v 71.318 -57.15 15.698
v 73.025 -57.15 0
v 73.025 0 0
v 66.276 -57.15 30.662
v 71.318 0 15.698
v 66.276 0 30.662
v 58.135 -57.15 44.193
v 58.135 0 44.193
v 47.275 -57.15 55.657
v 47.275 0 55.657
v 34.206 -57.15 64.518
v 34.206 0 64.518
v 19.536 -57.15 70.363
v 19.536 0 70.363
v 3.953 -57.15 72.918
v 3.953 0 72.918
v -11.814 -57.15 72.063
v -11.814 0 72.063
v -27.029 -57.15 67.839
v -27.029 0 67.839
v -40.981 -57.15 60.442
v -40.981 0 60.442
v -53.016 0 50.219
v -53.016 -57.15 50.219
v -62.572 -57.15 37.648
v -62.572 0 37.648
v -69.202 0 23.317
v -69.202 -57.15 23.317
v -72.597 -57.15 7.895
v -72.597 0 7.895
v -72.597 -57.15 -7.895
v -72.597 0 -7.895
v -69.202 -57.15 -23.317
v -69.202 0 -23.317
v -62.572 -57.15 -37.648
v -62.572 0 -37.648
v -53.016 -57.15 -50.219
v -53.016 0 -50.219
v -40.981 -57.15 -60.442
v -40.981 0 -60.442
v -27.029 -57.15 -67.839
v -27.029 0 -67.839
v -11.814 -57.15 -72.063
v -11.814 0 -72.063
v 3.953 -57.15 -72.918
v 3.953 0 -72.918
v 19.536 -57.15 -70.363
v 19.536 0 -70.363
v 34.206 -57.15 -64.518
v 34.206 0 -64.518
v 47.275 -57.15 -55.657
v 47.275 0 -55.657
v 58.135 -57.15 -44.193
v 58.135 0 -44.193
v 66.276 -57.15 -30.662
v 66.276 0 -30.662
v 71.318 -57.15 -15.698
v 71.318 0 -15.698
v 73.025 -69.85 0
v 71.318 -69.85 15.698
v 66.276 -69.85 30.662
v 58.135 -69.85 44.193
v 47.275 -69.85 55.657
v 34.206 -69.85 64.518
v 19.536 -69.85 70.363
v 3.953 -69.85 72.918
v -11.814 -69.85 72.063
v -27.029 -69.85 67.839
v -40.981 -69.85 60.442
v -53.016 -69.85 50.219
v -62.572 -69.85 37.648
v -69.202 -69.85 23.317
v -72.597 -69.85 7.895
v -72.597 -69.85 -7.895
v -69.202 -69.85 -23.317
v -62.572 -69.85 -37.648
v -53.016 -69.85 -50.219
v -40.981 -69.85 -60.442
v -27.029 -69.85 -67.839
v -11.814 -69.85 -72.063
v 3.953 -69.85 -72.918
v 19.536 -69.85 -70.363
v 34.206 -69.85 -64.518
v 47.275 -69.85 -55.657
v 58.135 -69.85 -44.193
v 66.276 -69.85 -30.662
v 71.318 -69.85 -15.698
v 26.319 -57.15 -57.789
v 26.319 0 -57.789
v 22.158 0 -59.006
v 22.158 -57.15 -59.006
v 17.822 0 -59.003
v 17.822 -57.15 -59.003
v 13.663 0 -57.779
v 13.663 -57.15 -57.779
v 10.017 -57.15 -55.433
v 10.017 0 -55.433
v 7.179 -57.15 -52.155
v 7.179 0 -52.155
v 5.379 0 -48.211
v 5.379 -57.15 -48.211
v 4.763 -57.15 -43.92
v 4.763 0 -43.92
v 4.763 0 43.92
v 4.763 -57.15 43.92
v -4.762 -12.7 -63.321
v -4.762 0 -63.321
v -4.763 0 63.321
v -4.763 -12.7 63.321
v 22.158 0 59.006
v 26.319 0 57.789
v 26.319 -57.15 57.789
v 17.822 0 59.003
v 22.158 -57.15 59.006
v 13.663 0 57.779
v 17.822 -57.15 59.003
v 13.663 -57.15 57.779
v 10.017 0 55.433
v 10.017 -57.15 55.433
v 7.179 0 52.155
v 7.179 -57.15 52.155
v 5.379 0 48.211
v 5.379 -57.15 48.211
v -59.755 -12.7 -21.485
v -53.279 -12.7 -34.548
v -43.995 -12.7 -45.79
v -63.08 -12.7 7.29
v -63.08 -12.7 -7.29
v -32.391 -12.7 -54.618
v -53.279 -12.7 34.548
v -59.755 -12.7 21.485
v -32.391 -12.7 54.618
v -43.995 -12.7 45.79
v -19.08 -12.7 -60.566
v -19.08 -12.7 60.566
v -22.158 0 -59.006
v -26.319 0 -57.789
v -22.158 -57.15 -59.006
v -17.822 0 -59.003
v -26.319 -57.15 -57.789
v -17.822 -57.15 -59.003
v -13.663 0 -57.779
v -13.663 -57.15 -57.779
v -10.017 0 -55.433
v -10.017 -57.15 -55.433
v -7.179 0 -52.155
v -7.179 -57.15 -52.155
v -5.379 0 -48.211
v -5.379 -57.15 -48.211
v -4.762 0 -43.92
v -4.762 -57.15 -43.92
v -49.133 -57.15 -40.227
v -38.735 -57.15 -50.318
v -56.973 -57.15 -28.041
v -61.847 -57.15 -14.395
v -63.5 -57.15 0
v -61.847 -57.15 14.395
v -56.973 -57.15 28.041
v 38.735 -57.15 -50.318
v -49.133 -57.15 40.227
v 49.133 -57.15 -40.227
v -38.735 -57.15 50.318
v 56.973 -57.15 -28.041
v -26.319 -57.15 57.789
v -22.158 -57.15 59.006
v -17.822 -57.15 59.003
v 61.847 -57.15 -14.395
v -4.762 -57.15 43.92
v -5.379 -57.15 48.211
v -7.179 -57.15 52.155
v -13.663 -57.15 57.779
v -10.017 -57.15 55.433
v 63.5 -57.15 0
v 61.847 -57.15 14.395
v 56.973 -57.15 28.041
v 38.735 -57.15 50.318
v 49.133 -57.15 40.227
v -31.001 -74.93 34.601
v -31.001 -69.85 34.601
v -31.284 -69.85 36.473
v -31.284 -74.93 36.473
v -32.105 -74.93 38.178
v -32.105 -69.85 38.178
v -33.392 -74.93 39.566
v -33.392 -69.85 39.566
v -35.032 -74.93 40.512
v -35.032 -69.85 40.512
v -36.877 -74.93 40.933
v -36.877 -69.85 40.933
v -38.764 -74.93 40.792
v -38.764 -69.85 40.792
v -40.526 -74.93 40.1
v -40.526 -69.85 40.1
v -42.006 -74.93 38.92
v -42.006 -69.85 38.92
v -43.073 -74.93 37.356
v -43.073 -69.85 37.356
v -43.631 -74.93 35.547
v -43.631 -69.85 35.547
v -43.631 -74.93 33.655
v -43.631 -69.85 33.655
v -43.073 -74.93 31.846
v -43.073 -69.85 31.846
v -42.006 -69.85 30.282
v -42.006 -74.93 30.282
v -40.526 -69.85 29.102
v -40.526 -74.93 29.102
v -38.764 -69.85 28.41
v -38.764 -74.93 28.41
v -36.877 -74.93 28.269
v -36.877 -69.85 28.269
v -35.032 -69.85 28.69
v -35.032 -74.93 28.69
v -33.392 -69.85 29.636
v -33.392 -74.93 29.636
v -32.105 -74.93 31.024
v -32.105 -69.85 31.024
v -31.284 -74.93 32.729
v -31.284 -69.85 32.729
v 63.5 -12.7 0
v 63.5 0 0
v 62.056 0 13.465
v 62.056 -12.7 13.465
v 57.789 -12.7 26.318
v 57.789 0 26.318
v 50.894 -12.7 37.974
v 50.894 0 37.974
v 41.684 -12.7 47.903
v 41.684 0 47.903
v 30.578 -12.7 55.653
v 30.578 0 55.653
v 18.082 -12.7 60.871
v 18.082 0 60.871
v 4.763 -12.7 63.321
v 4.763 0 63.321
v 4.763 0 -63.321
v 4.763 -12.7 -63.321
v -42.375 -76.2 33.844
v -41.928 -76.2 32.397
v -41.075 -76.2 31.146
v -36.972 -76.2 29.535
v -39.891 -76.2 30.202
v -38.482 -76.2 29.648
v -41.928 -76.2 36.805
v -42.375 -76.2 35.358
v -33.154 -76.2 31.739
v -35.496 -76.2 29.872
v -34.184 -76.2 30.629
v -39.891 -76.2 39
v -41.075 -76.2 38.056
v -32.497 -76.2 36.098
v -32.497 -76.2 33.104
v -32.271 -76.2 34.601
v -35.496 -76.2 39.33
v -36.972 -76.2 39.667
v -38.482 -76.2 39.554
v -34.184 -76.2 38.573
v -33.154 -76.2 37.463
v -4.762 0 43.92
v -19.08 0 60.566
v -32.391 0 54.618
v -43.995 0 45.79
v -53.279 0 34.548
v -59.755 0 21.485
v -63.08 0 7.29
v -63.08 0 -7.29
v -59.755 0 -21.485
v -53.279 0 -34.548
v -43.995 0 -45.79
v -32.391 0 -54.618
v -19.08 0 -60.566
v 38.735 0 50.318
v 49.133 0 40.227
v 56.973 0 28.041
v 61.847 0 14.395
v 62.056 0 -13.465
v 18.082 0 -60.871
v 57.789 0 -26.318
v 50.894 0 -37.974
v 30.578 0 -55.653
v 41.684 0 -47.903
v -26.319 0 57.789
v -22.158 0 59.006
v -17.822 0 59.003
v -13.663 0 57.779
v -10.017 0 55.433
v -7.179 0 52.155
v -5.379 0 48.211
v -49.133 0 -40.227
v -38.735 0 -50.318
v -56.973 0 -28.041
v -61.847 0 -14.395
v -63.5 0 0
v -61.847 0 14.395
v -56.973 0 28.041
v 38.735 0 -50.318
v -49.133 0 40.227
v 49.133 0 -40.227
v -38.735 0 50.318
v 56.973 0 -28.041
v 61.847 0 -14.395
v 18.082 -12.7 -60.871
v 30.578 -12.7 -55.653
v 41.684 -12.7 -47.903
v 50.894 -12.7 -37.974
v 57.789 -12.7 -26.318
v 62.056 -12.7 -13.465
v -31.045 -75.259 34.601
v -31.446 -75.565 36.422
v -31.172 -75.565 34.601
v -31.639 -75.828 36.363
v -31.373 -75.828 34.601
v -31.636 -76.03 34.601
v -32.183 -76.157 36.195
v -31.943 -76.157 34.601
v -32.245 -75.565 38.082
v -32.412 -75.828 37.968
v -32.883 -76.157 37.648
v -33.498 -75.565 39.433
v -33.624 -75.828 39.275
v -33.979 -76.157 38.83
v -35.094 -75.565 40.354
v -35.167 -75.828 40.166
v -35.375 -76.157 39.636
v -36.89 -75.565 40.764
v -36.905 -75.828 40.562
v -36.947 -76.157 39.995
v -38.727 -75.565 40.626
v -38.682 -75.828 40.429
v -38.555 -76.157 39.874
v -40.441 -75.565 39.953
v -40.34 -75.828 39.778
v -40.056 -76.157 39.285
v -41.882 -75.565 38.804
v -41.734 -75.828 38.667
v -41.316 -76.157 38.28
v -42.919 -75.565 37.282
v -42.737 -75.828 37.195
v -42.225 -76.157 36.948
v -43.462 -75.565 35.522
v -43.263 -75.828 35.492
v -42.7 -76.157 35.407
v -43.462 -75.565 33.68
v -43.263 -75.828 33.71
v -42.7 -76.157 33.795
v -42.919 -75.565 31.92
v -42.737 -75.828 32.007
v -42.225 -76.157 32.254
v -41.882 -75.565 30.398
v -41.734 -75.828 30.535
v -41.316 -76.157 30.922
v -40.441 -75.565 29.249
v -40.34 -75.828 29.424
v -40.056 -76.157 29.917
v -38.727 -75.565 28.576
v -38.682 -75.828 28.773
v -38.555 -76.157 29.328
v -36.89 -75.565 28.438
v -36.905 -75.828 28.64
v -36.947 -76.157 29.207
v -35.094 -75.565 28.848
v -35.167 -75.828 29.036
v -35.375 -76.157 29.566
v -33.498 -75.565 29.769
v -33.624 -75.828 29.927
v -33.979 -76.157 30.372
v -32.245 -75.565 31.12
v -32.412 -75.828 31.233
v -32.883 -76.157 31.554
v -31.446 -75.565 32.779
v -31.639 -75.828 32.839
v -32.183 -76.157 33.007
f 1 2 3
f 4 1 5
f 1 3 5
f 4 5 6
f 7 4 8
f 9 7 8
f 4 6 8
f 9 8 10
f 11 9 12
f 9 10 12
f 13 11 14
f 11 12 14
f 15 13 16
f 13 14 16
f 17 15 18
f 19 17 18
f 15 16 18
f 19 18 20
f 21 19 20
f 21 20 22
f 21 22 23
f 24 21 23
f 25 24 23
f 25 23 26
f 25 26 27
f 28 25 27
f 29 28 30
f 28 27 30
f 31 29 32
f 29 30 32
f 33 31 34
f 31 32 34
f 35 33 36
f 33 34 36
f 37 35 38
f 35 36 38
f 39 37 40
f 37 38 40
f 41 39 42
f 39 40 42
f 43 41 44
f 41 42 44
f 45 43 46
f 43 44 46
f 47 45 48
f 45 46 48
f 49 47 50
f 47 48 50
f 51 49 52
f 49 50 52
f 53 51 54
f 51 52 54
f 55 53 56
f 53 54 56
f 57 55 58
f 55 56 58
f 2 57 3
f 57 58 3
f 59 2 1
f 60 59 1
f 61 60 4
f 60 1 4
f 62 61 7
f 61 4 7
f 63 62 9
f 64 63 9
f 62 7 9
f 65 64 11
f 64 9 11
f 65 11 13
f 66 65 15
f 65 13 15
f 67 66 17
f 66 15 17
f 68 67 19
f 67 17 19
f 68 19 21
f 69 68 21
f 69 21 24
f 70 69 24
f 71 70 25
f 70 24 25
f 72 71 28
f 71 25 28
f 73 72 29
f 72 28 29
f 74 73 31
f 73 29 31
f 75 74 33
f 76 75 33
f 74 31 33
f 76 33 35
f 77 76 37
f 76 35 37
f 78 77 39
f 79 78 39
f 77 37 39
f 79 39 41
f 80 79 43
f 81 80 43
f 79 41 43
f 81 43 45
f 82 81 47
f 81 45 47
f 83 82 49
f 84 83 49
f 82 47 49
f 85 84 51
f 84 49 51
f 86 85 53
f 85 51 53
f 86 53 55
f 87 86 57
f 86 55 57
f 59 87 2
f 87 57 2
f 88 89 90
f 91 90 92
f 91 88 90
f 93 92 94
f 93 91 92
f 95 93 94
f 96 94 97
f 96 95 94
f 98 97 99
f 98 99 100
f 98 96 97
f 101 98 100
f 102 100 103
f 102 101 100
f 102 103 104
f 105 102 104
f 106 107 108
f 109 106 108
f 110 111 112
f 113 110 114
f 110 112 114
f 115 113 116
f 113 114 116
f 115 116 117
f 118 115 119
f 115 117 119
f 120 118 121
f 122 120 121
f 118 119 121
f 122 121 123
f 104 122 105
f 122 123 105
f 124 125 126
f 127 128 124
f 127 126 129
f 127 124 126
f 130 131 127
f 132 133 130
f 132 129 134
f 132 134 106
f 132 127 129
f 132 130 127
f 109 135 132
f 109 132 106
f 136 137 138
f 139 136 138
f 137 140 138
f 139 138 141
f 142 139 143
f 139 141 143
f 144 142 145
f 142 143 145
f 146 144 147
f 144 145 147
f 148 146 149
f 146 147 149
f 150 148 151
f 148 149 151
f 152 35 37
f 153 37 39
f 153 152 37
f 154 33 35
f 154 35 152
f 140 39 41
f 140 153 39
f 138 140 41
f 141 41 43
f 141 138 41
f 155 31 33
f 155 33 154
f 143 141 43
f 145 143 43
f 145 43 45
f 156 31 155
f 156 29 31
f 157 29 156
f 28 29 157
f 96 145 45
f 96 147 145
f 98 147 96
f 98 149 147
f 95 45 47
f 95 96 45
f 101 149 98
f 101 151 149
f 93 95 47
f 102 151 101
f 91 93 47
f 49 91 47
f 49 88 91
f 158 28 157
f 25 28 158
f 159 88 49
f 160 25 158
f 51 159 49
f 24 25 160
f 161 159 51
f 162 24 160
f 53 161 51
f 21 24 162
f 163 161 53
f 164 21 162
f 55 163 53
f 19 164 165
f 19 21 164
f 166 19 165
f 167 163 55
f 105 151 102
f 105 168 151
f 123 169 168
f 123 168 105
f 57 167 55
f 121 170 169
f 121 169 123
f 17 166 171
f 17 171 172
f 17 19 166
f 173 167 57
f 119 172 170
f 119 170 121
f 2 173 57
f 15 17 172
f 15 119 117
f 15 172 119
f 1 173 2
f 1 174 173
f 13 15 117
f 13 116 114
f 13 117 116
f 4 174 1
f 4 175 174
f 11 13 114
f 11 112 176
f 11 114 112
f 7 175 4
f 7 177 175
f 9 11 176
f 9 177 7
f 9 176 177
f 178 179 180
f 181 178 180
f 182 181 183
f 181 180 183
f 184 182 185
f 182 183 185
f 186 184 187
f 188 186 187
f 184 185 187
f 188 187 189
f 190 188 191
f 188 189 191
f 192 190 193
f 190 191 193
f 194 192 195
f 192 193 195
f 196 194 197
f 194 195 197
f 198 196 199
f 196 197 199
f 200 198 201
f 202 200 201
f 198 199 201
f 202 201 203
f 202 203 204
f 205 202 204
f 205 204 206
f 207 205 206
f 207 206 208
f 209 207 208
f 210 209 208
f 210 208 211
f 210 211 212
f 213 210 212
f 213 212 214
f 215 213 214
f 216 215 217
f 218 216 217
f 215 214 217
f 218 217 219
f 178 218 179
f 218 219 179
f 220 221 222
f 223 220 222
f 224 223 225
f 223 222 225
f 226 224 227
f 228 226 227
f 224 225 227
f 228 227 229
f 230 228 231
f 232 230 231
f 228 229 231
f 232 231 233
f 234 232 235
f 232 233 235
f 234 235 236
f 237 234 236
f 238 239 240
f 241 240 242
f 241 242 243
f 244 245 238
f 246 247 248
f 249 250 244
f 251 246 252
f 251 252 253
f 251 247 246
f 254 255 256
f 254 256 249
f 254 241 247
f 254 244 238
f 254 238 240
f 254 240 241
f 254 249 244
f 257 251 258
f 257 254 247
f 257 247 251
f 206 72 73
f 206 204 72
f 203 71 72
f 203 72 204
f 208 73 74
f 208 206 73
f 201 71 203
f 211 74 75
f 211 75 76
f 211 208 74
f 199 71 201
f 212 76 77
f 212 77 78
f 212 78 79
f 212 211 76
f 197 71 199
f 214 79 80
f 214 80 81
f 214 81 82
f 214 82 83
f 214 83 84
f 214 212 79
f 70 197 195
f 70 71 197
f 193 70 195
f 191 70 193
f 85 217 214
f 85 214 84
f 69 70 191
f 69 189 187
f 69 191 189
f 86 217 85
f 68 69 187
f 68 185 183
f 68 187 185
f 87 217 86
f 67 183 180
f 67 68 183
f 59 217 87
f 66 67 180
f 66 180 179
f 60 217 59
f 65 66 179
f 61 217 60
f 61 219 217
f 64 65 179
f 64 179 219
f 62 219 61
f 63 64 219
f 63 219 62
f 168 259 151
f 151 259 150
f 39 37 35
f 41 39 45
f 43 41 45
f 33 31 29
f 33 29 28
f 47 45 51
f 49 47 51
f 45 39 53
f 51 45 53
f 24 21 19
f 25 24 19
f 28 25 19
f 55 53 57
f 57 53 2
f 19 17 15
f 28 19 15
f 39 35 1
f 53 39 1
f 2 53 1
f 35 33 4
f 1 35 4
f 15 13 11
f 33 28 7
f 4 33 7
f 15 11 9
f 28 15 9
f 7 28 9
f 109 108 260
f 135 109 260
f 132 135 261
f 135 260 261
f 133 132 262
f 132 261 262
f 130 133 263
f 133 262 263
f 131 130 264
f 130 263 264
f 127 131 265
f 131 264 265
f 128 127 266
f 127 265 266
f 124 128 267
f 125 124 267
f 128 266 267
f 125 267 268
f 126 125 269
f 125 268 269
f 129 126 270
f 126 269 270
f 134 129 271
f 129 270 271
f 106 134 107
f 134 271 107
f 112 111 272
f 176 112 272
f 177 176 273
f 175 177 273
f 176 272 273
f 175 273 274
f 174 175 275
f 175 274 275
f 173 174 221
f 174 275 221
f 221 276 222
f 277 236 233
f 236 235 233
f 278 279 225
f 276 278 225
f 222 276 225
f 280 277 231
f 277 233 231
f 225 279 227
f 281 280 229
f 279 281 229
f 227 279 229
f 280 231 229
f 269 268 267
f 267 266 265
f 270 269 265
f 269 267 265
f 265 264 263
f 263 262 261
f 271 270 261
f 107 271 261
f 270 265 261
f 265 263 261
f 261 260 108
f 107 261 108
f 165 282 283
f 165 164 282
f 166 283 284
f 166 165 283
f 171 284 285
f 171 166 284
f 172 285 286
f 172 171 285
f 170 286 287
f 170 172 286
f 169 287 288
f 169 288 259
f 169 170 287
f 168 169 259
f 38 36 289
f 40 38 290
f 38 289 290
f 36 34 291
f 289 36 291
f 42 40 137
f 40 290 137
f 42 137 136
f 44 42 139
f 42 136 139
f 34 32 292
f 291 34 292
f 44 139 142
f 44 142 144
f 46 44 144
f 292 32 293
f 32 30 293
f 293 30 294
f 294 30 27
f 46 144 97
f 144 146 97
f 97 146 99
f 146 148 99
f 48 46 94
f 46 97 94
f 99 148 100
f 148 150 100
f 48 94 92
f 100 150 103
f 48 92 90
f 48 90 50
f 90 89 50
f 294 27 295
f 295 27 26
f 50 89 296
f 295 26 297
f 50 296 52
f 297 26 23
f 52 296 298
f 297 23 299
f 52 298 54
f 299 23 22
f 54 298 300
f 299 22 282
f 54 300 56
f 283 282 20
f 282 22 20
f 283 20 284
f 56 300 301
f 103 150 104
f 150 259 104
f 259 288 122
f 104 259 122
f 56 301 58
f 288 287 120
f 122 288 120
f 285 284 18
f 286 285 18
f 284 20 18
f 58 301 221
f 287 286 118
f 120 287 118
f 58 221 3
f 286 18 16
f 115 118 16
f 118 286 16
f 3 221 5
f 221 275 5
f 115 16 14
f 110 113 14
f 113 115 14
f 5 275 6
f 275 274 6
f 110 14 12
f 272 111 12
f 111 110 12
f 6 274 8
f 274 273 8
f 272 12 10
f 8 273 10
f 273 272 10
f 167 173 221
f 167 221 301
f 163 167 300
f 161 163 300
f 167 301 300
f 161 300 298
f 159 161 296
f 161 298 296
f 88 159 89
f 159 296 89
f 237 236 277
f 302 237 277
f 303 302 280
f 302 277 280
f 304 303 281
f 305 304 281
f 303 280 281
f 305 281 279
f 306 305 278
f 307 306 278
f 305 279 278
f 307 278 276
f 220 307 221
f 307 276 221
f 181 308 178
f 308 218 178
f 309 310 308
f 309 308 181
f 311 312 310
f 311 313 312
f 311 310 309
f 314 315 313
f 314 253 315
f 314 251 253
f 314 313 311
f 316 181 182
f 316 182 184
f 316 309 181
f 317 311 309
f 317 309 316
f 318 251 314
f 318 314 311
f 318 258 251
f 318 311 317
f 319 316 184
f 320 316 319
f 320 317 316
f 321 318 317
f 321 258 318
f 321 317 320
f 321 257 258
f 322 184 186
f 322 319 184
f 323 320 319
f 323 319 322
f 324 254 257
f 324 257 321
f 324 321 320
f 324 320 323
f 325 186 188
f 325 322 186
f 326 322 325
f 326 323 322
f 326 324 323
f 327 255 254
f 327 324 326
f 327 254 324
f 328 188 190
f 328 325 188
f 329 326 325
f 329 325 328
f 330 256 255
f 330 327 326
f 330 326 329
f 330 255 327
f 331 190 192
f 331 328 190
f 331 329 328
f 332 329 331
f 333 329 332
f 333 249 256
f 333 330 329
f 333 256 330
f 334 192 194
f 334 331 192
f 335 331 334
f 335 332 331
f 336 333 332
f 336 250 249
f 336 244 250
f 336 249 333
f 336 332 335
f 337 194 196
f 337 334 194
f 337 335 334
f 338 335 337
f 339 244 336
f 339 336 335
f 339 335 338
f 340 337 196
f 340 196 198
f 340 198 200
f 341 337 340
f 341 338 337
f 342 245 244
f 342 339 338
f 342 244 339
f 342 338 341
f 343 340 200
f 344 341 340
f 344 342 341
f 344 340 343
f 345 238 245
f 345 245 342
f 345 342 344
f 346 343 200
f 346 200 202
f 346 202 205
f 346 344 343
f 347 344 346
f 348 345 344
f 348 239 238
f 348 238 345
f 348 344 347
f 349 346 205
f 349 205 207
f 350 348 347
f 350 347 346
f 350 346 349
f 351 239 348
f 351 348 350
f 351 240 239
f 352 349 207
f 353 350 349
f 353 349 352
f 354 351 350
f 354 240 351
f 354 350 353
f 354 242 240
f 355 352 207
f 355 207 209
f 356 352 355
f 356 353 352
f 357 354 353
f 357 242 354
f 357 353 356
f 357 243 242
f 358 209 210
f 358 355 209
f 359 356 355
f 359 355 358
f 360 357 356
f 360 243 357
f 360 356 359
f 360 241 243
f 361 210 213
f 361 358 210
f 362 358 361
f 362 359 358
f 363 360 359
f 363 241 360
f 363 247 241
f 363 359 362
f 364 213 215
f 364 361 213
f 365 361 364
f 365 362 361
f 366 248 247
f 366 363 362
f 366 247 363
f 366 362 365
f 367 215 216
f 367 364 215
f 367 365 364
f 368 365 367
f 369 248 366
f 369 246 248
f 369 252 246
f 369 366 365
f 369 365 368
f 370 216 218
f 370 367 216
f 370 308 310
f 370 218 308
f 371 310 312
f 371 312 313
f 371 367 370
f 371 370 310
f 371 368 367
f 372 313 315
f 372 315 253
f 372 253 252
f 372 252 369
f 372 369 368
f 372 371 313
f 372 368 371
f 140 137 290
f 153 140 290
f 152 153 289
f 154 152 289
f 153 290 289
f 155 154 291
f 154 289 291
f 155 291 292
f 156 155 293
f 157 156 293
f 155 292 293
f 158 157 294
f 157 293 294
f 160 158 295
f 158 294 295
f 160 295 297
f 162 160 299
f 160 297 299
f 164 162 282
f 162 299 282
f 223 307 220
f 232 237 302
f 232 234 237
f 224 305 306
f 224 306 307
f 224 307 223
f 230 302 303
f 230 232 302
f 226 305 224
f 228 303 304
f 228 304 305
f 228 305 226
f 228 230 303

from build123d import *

# Parameters (mm, degrees)
F0_R     = 73.025
F1_DEPTH = 57.15
F2_DEPTH = 12.7
F3_R     = 15.24
F5_R     = 73.025
F6_DEPTH = 12.7
F7_R     = 6.35
F8_DEPTH = 6.35
F9_R     = 1.27


with BuildPart() as f1:
    # F0 (on Front) → F1 (new body)
    with BuildSketch(Plane.XZ):
        Circle(F0_R)
        with BuildLine():
            ThreePointArc((4.7625, 63.3211543937), (46.5546385981, 43.1846688652), (63.5, 0))
            ThreePointArc((63.5, 0), (46.5546385981, -43.1846688652), (4.7625, -63.3211543937))
            ThreePointArc((4.7625, -63.3211543937), (0, -63.5), (-4.7625, -63.3211543937))
            ThreePointArc((-4.7625, -63.3211543937), (-63.5, 0), (-4.7625, 63.3211543937))
            ThreePointArc((-4.7625, 63.3211543937), (0, 63.5), (4.7625, 63.3211543937))
        make_face(mode=Mode.SUBTRACT)
        with BuildLine():
            Line((4.7625, 0), (4.7625, 63.3211543937))
            ThreePointArc((4.7625, 63.3211543937), (0, 63.5), (-4.7625, 63.3211543937))
            Line((-4.7625, 63.3211543937), (-4.7625, 0))
            Line((-4.7625, 0), (0, 0))
            Line((0, 0), (4.7625, 0))
        make_face()
        with BuildLine():
            ThreePointArc((-4.7625, -63.3211543937), (0, -63.5), (4.7625, -63.3211543937))
            Line((4.7625, -63.3211543937), (4.7625, 0))
            Line((4.7625, 0), (0, 0))
            Line((0, 0), (-4.7625, 0))
            Line((-4.7625, 0), (-4.7625, -63.3211543937))
        make_face()
    extrude(amount=F1_DEPTH)

    # F3
    f3_edges = [f1.edges().sort_by_distance(p)[0] for p in [
        (-4.7625, -28.575, 63.321154),
        (4.7625, -28.575, 63.321154),
        (4.7625, -28.575, -63.321154),
        (-4.7625, -28.575, -63.321154),
    ]]
    fillet(f3_edges, radius=F3_R)


with BuildPart() as f2:
    # F0 (on Front) → F2 (new body)
    with BuildSketch(Plane.XZ):
        with BuildLine():
            Line((-4.7625, 0), (-4.7625, 63.3211543937))
            ThreePointArc((-4.7625, 63.3211543937), (-63.5, 0), (-4.7625, -63.3211543937))
            Line((-4.7625, -63.3211543937), (-4.7625, 0))
        make_face()
    extrude(amount=F2_DEPTH)


with BuildPart() as f2b:
    # F0 (on Front) → F2, piece 2 (new body)
    with BuildSketch(Plane.XZ):
        with BuildLine():
            ThreePointArc((4.7625, -63.3211543937), (46.5546385981, -43.1846688652), (63.5, 0))
            ThreePointArc((63.5, 0), (46.5546385981, 43.1846688652), (4.7625, 63.3211543937))
            Line((4.7625, 63.3211543937), (4.7625, 0))
            Line((4.7625, 0), (4.7625, -63.3211543937))
        make_face()
    extrude(amount=F2_DEPTH)


with BuildPart() as f6:
    # F5 (on offset) → F6 (new body)
    with BuildSketch(Plane.XZ.offset(57.15)):
        Circle(F5_R)
    extrude(amount=F6_DEPTH)

    # F7 (on face) → F8 (join)
    with BuildSketch(Plane.XZ.offset(69.85)):
        with Locations((-37.3514518142, 34.6009396017)):
            Circle(F7_R)
    extrude(amount=F8_DEPTH)

    # F9
    f9_edges = [f6.edges().sort_by_distance(p)[0] for p in [
        (-43.701452, -76.2, 34.60094),
    ]]
    fillet(f9_edges, radius=F9_R)


solid = Compound([f1.part, f2.part, f2b.part, f6.part])
